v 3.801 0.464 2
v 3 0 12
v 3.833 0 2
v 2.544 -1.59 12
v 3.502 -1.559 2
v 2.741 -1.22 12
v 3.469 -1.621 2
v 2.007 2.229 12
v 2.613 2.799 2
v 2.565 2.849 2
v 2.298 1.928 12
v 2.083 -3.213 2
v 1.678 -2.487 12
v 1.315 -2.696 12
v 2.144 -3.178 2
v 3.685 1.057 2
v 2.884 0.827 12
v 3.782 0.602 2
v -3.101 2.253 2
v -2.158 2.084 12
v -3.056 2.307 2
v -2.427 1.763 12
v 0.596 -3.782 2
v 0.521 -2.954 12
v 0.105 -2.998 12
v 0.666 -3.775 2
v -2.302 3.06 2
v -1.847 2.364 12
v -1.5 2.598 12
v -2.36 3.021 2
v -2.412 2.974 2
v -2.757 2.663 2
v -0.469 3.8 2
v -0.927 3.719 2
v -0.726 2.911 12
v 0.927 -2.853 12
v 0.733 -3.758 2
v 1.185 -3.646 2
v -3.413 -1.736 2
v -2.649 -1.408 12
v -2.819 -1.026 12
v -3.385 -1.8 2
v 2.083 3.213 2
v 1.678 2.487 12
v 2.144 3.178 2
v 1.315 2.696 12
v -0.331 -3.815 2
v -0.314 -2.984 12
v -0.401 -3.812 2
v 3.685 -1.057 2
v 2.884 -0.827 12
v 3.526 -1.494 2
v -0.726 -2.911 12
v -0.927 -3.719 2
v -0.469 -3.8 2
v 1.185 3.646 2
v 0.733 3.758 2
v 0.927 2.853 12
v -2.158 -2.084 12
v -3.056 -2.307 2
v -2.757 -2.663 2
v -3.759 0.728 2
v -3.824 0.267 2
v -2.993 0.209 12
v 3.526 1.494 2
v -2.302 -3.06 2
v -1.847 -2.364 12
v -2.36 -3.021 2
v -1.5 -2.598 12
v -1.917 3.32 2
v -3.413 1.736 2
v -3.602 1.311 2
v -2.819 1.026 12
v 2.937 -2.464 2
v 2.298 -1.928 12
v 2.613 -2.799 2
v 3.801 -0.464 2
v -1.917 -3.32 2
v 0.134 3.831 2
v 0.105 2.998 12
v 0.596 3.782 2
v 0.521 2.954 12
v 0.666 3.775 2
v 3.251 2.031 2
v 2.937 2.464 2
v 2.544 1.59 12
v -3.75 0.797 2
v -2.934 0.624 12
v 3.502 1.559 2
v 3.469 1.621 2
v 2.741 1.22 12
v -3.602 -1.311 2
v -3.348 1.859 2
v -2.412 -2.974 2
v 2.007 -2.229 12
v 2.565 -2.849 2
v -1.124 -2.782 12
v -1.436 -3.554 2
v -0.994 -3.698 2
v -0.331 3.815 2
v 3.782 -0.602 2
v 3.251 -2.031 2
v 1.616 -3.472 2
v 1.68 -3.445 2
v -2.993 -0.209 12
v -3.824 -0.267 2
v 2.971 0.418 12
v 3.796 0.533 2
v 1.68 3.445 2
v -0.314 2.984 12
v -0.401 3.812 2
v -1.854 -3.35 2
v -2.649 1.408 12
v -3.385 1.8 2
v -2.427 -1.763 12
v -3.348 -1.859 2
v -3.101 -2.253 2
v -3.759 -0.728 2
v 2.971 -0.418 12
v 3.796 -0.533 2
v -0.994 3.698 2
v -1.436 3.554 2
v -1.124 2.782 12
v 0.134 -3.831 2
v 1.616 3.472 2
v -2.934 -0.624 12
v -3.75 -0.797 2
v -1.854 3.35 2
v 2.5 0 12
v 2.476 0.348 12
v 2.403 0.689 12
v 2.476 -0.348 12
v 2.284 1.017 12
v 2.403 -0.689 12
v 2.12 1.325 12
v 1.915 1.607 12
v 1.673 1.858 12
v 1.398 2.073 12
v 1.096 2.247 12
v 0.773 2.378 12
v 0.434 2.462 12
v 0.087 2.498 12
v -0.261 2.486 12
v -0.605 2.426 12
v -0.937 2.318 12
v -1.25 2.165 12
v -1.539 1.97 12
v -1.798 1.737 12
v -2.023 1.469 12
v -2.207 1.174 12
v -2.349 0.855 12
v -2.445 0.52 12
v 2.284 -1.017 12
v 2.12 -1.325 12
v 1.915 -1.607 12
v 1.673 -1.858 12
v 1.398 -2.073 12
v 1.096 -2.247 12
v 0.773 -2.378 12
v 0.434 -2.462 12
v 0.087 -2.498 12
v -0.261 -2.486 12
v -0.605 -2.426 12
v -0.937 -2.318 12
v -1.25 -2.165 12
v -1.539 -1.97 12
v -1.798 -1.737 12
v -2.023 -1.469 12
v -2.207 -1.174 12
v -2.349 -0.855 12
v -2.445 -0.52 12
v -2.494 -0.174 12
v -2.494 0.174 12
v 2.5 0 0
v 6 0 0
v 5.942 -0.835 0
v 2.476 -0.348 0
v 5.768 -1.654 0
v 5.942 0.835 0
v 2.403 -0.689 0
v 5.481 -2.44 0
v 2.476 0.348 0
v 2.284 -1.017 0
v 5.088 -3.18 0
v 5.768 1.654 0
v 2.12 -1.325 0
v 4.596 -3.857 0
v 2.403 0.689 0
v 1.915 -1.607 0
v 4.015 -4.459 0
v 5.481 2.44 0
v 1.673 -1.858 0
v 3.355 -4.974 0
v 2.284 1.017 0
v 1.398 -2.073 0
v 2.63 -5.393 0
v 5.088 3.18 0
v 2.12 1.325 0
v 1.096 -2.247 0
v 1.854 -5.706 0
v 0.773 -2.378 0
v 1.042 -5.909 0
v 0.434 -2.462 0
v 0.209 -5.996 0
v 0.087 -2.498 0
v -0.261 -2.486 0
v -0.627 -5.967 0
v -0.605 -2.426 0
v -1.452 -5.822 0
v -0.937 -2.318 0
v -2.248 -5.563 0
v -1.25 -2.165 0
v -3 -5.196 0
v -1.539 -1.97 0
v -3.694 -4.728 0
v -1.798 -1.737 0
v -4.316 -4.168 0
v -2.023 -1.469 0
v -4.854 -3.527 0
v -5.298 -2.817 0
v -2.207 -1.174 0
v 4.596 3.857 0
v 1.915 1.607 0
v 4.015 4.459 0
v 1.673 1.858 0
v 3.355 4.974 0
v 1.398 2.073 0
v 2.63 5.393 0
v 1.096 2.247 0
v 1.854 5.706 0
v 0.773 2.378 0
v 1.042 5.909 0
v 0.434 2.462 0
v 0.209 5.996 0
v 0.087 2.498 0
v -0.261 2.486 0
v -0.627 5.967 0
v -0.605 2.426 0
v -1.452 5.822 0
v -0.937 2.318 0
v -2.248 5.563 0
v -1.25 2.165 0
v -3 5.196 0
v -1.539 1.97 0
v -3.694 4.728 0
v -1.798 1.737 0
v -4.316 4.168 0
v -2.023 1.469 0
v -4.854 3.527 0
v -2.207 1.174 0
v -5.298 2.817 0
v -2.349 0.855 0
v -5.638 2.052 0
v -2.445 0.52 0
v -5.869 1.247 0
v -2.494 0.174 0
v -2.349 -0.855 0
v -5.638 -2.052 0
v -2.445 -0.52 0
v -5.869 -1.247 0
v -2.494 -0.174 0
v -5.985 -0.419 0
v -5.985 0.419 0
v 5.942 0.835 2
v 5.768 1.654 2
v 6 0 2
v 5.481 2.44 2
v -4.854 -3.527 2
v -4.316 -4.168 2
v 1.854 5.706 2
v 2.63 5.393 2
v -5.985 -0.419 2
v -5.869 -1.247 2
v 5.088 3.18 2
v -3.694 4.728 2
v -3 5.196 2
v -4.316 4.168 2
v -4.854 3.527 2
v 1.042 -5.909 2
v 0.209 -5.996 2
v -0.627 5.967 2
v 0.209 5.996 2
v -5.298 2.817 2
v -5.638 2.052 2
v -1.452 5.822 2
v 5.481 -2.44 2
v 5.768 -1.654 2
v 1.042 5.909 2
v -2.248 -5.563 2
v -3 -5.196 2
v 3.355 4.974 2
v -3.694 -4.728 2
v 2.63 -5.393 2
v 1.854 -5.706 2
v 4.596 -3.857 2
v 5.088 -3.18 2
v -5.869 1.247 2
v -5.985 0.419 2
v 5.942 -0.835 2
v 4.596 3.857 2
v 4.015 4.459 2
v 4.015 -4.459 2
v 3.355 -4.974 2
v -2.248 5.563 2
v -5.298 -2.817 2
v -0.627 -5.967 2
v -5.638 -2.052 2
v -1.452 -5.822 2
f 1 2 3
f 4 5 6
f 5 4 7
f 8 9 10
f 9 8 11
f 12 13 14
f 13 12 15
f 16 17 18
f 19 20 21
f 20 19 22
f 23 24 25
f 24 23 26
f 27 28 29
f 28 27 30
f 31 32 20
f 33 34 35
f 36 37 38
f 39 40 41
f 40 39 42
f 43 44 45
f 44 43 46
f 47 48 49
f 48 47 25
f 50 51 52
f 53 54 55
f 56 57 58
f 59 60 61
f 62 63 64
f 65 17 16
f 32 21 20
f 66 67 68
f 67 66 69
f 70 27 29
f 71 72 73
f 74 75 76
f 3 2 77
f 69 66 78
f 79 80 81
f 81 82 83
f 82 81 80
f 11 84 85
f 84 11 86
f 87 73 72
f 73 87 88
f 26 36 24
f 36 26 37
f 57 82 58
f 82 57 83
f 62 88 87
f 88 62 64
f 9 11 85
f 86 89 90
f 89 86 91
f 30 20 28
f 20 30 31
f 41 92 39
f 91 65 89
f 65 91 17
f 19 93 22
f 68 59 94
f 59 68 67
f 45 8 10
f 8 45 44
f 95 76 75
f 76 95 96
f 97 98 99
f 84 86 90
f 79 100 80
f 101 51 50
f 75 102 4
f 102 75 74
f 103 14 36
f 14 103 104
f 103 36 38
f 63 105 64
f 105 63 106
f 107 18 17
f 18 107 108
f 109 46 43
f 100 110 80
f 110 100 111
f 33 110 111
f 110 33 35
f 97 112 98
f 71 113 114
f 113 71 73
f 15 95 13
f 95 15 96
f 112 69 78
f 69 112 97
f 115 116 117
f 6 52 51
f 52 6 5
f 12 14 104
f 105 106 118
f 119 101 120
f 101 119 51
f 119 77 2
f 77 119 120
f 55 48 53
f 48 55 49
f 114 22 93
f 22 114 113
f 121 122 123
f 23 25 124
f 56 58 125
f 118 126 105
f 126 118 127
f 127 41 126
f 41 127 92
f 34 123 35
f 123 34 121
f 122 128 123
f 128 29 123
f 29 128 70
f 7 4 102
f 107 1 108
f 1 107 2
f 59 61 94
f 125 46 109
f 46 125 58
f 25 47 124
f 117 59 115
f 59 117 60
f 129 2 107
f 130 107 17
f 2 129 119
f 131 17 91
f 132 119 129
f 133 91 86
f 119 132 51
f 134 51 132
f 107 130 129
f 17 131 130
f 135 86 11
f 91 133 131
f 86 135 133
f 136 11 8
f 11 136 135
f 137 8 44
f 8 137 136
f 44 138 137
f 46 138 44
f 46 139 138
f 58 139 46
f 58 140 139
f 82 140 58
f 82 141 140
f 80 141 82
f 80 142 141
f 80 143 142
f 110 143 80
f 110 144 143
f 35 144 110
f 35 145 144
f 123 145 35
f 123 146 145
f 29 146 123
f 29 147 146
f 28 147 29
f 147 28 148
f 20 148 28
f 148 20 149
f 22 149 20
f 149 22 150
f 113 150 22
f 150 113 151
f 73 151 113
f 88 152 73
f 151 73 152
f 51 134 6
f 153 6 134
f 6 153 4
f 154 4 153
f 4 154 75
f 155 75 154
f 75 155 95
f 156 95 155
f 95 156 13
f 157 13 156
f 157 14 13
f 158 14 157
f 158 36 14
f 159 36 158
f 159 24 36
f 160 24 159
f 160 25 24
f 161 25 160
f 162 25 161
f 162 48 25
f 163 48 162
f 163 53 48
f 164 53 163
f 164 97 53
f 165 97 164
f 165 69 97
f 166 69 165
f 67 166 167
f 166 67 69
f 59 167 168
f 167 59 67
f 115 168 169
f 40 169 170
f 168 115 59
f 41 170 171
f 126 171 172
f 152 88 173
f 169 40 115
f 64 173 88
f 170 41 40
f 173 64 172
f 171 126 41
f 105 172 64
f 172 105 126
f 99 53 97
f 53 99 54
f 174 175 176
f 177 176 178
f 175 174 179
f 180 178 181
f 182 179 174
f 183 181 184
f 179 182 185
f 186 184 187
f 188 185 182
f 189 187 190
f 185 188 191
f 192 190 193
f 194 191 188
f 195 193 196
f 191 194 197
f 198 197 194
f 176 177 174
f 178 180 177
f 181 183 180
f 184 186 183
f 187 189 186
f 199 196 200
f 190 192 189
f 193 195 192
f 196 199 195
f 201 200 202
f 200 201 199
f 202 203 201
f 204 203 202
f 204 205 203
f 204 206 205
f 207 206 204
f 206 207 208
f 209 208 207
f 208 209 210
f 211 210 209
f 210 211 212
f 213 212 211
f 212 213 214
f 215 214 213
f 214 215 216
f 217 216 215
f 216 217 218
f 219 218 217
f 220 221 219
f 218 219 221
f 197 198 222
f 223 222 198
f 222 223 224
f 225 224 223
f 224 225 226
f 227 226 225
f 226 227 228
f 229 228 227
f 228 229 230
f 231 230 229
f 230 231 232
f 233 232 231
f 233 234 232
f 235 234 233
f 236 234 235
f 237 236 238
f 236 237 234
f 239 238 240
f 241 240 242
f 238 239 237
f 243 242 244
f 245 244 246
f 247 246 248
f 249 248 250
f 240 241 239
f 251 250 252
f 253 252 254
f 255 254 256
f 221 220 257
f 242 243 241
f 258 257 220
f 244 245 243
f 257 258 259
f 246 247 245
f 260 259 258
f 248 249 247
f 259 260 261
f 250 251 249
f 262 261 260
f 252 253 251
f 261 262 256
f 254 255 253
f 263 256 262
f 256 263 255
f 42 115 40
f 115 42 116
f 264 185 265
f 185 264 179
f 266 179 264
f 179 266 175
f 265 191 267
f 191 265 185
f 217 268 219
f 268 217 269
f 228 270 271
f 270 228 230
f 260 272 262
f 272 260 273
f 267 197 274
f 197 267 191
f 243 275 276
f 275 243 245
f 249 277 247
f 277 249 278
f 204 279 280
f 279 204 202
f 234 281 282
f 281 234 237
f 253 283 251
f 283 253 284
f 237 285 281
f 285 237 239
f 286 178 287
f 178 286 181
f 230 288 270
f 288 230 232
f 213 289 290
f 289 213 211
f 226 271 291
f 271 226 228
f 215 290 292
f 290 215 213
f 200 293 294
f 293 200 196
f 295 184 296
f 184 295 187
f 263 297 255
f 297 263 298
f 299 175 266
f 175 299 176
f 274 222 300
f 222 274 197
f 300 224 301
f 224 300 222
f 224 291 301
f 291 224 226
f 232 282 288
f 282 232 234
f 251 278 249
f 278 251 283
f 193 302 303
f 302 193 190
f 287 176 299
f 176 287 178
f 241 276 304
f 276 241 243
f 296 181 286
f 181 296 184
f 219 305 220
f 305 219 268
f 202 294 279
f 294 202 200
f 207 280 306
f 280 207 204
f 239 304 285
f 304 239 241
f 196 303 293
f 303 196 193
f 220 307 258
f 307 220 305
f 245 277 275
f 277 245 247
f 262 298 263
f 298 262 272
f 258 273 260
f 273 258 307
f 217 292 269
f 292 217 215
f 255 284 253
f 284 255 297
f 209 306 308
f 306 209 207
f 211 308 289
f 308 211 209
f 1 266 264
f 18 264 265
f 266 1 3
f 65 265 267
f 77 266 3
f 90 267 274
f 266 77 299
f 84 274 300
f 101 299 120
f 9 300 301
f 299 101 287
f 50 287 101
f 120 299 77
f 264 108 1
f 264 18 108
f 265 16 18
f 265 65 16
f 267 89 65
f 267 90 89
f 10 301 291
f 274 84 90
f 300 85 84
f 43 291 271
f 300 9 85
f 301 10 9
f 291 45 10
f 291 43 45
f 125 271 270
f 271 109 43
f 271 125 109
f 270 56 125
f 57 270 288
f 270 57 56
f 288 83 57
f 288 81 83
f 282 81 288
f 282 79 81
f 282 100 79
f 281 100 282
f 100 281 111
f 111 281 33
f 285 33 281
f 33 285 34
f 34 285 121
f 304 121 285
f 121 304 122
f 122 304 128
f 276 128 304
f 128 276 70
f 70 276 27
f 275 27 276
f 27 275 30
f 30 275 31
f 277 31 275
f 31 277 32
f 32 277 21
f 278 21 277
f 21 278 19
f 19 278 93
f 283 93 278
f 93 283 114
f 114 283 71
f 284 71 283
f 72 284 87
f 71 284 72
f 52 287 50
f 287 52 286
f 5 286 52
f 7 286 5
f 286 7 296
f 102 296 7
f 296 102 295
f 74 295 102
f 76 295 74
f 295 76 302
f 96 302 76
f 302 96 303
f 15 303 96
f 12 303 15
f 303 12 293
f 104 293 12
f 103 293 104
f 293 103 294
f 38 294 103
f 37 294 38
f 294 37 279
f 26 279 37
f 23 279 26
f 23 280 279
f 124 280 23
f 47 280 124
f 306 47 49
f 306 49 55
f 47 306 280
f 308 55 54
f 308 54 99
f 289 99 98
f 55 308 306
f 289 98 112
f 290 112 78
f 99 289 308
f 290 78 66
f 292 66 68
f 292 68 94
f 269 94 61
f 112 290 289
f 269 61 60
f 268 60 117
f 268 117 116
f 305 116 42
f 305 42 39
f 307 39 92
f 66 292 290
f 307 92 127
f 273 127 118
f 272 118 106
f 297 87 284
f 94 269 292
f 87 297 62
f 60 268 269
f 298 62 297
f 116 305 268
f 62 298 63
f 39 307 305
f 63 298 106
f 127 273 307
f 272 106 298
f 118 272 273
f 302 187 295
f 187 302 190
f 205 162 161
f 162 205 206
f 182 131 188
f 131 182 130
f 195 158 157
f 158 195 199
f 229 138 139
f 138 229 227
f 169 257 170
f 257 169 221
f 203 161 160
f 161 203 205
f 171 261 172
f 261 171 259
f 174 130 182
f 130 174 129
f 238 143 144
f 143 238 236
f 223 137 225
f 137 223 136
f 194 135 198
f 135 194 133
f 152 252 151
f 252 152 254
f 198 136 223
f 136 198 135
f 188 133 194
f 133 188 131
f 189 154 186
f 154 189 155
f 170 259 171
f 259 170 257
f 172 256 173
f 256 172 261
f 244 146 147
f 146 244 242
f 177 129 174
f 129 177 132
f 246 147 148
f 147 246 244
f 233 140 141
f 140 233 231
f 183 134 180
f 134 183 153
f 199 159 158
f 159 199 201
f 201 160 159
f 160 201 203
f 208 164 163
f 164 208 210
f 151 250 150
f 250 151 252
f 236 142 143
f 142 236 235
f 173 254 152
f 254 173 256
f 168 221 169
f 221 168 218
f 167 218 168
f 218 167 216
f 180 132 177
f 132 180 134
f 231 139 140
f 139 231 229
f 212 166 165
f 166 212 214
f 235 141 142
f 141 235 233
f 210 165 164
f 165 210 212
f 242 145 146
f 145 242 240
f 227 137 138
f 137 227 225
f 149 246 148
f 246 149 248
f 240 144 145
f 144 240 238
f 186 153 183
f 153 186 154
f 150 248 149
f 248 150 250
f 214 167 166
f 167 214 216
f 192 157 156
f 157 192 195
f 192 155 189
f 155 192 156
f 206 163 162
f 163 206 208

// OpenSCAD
HEIGHT = 12;
HOLE = 5;
TOP_R = 3;
BOT_R = 4;
BASE_H = 2;
BASE_D = 12;

$fn=45; // Smoothness but larger numbers render slower

difference()
{
    union()
    {
        cylinder(h=HEIGHT, r1=BOT_R, r2=TOP_R);
        cylinder(h=BASE_H, d=BASE_D);
    }
    cylinder(h=HEIGHT, d=HOLE);
}
